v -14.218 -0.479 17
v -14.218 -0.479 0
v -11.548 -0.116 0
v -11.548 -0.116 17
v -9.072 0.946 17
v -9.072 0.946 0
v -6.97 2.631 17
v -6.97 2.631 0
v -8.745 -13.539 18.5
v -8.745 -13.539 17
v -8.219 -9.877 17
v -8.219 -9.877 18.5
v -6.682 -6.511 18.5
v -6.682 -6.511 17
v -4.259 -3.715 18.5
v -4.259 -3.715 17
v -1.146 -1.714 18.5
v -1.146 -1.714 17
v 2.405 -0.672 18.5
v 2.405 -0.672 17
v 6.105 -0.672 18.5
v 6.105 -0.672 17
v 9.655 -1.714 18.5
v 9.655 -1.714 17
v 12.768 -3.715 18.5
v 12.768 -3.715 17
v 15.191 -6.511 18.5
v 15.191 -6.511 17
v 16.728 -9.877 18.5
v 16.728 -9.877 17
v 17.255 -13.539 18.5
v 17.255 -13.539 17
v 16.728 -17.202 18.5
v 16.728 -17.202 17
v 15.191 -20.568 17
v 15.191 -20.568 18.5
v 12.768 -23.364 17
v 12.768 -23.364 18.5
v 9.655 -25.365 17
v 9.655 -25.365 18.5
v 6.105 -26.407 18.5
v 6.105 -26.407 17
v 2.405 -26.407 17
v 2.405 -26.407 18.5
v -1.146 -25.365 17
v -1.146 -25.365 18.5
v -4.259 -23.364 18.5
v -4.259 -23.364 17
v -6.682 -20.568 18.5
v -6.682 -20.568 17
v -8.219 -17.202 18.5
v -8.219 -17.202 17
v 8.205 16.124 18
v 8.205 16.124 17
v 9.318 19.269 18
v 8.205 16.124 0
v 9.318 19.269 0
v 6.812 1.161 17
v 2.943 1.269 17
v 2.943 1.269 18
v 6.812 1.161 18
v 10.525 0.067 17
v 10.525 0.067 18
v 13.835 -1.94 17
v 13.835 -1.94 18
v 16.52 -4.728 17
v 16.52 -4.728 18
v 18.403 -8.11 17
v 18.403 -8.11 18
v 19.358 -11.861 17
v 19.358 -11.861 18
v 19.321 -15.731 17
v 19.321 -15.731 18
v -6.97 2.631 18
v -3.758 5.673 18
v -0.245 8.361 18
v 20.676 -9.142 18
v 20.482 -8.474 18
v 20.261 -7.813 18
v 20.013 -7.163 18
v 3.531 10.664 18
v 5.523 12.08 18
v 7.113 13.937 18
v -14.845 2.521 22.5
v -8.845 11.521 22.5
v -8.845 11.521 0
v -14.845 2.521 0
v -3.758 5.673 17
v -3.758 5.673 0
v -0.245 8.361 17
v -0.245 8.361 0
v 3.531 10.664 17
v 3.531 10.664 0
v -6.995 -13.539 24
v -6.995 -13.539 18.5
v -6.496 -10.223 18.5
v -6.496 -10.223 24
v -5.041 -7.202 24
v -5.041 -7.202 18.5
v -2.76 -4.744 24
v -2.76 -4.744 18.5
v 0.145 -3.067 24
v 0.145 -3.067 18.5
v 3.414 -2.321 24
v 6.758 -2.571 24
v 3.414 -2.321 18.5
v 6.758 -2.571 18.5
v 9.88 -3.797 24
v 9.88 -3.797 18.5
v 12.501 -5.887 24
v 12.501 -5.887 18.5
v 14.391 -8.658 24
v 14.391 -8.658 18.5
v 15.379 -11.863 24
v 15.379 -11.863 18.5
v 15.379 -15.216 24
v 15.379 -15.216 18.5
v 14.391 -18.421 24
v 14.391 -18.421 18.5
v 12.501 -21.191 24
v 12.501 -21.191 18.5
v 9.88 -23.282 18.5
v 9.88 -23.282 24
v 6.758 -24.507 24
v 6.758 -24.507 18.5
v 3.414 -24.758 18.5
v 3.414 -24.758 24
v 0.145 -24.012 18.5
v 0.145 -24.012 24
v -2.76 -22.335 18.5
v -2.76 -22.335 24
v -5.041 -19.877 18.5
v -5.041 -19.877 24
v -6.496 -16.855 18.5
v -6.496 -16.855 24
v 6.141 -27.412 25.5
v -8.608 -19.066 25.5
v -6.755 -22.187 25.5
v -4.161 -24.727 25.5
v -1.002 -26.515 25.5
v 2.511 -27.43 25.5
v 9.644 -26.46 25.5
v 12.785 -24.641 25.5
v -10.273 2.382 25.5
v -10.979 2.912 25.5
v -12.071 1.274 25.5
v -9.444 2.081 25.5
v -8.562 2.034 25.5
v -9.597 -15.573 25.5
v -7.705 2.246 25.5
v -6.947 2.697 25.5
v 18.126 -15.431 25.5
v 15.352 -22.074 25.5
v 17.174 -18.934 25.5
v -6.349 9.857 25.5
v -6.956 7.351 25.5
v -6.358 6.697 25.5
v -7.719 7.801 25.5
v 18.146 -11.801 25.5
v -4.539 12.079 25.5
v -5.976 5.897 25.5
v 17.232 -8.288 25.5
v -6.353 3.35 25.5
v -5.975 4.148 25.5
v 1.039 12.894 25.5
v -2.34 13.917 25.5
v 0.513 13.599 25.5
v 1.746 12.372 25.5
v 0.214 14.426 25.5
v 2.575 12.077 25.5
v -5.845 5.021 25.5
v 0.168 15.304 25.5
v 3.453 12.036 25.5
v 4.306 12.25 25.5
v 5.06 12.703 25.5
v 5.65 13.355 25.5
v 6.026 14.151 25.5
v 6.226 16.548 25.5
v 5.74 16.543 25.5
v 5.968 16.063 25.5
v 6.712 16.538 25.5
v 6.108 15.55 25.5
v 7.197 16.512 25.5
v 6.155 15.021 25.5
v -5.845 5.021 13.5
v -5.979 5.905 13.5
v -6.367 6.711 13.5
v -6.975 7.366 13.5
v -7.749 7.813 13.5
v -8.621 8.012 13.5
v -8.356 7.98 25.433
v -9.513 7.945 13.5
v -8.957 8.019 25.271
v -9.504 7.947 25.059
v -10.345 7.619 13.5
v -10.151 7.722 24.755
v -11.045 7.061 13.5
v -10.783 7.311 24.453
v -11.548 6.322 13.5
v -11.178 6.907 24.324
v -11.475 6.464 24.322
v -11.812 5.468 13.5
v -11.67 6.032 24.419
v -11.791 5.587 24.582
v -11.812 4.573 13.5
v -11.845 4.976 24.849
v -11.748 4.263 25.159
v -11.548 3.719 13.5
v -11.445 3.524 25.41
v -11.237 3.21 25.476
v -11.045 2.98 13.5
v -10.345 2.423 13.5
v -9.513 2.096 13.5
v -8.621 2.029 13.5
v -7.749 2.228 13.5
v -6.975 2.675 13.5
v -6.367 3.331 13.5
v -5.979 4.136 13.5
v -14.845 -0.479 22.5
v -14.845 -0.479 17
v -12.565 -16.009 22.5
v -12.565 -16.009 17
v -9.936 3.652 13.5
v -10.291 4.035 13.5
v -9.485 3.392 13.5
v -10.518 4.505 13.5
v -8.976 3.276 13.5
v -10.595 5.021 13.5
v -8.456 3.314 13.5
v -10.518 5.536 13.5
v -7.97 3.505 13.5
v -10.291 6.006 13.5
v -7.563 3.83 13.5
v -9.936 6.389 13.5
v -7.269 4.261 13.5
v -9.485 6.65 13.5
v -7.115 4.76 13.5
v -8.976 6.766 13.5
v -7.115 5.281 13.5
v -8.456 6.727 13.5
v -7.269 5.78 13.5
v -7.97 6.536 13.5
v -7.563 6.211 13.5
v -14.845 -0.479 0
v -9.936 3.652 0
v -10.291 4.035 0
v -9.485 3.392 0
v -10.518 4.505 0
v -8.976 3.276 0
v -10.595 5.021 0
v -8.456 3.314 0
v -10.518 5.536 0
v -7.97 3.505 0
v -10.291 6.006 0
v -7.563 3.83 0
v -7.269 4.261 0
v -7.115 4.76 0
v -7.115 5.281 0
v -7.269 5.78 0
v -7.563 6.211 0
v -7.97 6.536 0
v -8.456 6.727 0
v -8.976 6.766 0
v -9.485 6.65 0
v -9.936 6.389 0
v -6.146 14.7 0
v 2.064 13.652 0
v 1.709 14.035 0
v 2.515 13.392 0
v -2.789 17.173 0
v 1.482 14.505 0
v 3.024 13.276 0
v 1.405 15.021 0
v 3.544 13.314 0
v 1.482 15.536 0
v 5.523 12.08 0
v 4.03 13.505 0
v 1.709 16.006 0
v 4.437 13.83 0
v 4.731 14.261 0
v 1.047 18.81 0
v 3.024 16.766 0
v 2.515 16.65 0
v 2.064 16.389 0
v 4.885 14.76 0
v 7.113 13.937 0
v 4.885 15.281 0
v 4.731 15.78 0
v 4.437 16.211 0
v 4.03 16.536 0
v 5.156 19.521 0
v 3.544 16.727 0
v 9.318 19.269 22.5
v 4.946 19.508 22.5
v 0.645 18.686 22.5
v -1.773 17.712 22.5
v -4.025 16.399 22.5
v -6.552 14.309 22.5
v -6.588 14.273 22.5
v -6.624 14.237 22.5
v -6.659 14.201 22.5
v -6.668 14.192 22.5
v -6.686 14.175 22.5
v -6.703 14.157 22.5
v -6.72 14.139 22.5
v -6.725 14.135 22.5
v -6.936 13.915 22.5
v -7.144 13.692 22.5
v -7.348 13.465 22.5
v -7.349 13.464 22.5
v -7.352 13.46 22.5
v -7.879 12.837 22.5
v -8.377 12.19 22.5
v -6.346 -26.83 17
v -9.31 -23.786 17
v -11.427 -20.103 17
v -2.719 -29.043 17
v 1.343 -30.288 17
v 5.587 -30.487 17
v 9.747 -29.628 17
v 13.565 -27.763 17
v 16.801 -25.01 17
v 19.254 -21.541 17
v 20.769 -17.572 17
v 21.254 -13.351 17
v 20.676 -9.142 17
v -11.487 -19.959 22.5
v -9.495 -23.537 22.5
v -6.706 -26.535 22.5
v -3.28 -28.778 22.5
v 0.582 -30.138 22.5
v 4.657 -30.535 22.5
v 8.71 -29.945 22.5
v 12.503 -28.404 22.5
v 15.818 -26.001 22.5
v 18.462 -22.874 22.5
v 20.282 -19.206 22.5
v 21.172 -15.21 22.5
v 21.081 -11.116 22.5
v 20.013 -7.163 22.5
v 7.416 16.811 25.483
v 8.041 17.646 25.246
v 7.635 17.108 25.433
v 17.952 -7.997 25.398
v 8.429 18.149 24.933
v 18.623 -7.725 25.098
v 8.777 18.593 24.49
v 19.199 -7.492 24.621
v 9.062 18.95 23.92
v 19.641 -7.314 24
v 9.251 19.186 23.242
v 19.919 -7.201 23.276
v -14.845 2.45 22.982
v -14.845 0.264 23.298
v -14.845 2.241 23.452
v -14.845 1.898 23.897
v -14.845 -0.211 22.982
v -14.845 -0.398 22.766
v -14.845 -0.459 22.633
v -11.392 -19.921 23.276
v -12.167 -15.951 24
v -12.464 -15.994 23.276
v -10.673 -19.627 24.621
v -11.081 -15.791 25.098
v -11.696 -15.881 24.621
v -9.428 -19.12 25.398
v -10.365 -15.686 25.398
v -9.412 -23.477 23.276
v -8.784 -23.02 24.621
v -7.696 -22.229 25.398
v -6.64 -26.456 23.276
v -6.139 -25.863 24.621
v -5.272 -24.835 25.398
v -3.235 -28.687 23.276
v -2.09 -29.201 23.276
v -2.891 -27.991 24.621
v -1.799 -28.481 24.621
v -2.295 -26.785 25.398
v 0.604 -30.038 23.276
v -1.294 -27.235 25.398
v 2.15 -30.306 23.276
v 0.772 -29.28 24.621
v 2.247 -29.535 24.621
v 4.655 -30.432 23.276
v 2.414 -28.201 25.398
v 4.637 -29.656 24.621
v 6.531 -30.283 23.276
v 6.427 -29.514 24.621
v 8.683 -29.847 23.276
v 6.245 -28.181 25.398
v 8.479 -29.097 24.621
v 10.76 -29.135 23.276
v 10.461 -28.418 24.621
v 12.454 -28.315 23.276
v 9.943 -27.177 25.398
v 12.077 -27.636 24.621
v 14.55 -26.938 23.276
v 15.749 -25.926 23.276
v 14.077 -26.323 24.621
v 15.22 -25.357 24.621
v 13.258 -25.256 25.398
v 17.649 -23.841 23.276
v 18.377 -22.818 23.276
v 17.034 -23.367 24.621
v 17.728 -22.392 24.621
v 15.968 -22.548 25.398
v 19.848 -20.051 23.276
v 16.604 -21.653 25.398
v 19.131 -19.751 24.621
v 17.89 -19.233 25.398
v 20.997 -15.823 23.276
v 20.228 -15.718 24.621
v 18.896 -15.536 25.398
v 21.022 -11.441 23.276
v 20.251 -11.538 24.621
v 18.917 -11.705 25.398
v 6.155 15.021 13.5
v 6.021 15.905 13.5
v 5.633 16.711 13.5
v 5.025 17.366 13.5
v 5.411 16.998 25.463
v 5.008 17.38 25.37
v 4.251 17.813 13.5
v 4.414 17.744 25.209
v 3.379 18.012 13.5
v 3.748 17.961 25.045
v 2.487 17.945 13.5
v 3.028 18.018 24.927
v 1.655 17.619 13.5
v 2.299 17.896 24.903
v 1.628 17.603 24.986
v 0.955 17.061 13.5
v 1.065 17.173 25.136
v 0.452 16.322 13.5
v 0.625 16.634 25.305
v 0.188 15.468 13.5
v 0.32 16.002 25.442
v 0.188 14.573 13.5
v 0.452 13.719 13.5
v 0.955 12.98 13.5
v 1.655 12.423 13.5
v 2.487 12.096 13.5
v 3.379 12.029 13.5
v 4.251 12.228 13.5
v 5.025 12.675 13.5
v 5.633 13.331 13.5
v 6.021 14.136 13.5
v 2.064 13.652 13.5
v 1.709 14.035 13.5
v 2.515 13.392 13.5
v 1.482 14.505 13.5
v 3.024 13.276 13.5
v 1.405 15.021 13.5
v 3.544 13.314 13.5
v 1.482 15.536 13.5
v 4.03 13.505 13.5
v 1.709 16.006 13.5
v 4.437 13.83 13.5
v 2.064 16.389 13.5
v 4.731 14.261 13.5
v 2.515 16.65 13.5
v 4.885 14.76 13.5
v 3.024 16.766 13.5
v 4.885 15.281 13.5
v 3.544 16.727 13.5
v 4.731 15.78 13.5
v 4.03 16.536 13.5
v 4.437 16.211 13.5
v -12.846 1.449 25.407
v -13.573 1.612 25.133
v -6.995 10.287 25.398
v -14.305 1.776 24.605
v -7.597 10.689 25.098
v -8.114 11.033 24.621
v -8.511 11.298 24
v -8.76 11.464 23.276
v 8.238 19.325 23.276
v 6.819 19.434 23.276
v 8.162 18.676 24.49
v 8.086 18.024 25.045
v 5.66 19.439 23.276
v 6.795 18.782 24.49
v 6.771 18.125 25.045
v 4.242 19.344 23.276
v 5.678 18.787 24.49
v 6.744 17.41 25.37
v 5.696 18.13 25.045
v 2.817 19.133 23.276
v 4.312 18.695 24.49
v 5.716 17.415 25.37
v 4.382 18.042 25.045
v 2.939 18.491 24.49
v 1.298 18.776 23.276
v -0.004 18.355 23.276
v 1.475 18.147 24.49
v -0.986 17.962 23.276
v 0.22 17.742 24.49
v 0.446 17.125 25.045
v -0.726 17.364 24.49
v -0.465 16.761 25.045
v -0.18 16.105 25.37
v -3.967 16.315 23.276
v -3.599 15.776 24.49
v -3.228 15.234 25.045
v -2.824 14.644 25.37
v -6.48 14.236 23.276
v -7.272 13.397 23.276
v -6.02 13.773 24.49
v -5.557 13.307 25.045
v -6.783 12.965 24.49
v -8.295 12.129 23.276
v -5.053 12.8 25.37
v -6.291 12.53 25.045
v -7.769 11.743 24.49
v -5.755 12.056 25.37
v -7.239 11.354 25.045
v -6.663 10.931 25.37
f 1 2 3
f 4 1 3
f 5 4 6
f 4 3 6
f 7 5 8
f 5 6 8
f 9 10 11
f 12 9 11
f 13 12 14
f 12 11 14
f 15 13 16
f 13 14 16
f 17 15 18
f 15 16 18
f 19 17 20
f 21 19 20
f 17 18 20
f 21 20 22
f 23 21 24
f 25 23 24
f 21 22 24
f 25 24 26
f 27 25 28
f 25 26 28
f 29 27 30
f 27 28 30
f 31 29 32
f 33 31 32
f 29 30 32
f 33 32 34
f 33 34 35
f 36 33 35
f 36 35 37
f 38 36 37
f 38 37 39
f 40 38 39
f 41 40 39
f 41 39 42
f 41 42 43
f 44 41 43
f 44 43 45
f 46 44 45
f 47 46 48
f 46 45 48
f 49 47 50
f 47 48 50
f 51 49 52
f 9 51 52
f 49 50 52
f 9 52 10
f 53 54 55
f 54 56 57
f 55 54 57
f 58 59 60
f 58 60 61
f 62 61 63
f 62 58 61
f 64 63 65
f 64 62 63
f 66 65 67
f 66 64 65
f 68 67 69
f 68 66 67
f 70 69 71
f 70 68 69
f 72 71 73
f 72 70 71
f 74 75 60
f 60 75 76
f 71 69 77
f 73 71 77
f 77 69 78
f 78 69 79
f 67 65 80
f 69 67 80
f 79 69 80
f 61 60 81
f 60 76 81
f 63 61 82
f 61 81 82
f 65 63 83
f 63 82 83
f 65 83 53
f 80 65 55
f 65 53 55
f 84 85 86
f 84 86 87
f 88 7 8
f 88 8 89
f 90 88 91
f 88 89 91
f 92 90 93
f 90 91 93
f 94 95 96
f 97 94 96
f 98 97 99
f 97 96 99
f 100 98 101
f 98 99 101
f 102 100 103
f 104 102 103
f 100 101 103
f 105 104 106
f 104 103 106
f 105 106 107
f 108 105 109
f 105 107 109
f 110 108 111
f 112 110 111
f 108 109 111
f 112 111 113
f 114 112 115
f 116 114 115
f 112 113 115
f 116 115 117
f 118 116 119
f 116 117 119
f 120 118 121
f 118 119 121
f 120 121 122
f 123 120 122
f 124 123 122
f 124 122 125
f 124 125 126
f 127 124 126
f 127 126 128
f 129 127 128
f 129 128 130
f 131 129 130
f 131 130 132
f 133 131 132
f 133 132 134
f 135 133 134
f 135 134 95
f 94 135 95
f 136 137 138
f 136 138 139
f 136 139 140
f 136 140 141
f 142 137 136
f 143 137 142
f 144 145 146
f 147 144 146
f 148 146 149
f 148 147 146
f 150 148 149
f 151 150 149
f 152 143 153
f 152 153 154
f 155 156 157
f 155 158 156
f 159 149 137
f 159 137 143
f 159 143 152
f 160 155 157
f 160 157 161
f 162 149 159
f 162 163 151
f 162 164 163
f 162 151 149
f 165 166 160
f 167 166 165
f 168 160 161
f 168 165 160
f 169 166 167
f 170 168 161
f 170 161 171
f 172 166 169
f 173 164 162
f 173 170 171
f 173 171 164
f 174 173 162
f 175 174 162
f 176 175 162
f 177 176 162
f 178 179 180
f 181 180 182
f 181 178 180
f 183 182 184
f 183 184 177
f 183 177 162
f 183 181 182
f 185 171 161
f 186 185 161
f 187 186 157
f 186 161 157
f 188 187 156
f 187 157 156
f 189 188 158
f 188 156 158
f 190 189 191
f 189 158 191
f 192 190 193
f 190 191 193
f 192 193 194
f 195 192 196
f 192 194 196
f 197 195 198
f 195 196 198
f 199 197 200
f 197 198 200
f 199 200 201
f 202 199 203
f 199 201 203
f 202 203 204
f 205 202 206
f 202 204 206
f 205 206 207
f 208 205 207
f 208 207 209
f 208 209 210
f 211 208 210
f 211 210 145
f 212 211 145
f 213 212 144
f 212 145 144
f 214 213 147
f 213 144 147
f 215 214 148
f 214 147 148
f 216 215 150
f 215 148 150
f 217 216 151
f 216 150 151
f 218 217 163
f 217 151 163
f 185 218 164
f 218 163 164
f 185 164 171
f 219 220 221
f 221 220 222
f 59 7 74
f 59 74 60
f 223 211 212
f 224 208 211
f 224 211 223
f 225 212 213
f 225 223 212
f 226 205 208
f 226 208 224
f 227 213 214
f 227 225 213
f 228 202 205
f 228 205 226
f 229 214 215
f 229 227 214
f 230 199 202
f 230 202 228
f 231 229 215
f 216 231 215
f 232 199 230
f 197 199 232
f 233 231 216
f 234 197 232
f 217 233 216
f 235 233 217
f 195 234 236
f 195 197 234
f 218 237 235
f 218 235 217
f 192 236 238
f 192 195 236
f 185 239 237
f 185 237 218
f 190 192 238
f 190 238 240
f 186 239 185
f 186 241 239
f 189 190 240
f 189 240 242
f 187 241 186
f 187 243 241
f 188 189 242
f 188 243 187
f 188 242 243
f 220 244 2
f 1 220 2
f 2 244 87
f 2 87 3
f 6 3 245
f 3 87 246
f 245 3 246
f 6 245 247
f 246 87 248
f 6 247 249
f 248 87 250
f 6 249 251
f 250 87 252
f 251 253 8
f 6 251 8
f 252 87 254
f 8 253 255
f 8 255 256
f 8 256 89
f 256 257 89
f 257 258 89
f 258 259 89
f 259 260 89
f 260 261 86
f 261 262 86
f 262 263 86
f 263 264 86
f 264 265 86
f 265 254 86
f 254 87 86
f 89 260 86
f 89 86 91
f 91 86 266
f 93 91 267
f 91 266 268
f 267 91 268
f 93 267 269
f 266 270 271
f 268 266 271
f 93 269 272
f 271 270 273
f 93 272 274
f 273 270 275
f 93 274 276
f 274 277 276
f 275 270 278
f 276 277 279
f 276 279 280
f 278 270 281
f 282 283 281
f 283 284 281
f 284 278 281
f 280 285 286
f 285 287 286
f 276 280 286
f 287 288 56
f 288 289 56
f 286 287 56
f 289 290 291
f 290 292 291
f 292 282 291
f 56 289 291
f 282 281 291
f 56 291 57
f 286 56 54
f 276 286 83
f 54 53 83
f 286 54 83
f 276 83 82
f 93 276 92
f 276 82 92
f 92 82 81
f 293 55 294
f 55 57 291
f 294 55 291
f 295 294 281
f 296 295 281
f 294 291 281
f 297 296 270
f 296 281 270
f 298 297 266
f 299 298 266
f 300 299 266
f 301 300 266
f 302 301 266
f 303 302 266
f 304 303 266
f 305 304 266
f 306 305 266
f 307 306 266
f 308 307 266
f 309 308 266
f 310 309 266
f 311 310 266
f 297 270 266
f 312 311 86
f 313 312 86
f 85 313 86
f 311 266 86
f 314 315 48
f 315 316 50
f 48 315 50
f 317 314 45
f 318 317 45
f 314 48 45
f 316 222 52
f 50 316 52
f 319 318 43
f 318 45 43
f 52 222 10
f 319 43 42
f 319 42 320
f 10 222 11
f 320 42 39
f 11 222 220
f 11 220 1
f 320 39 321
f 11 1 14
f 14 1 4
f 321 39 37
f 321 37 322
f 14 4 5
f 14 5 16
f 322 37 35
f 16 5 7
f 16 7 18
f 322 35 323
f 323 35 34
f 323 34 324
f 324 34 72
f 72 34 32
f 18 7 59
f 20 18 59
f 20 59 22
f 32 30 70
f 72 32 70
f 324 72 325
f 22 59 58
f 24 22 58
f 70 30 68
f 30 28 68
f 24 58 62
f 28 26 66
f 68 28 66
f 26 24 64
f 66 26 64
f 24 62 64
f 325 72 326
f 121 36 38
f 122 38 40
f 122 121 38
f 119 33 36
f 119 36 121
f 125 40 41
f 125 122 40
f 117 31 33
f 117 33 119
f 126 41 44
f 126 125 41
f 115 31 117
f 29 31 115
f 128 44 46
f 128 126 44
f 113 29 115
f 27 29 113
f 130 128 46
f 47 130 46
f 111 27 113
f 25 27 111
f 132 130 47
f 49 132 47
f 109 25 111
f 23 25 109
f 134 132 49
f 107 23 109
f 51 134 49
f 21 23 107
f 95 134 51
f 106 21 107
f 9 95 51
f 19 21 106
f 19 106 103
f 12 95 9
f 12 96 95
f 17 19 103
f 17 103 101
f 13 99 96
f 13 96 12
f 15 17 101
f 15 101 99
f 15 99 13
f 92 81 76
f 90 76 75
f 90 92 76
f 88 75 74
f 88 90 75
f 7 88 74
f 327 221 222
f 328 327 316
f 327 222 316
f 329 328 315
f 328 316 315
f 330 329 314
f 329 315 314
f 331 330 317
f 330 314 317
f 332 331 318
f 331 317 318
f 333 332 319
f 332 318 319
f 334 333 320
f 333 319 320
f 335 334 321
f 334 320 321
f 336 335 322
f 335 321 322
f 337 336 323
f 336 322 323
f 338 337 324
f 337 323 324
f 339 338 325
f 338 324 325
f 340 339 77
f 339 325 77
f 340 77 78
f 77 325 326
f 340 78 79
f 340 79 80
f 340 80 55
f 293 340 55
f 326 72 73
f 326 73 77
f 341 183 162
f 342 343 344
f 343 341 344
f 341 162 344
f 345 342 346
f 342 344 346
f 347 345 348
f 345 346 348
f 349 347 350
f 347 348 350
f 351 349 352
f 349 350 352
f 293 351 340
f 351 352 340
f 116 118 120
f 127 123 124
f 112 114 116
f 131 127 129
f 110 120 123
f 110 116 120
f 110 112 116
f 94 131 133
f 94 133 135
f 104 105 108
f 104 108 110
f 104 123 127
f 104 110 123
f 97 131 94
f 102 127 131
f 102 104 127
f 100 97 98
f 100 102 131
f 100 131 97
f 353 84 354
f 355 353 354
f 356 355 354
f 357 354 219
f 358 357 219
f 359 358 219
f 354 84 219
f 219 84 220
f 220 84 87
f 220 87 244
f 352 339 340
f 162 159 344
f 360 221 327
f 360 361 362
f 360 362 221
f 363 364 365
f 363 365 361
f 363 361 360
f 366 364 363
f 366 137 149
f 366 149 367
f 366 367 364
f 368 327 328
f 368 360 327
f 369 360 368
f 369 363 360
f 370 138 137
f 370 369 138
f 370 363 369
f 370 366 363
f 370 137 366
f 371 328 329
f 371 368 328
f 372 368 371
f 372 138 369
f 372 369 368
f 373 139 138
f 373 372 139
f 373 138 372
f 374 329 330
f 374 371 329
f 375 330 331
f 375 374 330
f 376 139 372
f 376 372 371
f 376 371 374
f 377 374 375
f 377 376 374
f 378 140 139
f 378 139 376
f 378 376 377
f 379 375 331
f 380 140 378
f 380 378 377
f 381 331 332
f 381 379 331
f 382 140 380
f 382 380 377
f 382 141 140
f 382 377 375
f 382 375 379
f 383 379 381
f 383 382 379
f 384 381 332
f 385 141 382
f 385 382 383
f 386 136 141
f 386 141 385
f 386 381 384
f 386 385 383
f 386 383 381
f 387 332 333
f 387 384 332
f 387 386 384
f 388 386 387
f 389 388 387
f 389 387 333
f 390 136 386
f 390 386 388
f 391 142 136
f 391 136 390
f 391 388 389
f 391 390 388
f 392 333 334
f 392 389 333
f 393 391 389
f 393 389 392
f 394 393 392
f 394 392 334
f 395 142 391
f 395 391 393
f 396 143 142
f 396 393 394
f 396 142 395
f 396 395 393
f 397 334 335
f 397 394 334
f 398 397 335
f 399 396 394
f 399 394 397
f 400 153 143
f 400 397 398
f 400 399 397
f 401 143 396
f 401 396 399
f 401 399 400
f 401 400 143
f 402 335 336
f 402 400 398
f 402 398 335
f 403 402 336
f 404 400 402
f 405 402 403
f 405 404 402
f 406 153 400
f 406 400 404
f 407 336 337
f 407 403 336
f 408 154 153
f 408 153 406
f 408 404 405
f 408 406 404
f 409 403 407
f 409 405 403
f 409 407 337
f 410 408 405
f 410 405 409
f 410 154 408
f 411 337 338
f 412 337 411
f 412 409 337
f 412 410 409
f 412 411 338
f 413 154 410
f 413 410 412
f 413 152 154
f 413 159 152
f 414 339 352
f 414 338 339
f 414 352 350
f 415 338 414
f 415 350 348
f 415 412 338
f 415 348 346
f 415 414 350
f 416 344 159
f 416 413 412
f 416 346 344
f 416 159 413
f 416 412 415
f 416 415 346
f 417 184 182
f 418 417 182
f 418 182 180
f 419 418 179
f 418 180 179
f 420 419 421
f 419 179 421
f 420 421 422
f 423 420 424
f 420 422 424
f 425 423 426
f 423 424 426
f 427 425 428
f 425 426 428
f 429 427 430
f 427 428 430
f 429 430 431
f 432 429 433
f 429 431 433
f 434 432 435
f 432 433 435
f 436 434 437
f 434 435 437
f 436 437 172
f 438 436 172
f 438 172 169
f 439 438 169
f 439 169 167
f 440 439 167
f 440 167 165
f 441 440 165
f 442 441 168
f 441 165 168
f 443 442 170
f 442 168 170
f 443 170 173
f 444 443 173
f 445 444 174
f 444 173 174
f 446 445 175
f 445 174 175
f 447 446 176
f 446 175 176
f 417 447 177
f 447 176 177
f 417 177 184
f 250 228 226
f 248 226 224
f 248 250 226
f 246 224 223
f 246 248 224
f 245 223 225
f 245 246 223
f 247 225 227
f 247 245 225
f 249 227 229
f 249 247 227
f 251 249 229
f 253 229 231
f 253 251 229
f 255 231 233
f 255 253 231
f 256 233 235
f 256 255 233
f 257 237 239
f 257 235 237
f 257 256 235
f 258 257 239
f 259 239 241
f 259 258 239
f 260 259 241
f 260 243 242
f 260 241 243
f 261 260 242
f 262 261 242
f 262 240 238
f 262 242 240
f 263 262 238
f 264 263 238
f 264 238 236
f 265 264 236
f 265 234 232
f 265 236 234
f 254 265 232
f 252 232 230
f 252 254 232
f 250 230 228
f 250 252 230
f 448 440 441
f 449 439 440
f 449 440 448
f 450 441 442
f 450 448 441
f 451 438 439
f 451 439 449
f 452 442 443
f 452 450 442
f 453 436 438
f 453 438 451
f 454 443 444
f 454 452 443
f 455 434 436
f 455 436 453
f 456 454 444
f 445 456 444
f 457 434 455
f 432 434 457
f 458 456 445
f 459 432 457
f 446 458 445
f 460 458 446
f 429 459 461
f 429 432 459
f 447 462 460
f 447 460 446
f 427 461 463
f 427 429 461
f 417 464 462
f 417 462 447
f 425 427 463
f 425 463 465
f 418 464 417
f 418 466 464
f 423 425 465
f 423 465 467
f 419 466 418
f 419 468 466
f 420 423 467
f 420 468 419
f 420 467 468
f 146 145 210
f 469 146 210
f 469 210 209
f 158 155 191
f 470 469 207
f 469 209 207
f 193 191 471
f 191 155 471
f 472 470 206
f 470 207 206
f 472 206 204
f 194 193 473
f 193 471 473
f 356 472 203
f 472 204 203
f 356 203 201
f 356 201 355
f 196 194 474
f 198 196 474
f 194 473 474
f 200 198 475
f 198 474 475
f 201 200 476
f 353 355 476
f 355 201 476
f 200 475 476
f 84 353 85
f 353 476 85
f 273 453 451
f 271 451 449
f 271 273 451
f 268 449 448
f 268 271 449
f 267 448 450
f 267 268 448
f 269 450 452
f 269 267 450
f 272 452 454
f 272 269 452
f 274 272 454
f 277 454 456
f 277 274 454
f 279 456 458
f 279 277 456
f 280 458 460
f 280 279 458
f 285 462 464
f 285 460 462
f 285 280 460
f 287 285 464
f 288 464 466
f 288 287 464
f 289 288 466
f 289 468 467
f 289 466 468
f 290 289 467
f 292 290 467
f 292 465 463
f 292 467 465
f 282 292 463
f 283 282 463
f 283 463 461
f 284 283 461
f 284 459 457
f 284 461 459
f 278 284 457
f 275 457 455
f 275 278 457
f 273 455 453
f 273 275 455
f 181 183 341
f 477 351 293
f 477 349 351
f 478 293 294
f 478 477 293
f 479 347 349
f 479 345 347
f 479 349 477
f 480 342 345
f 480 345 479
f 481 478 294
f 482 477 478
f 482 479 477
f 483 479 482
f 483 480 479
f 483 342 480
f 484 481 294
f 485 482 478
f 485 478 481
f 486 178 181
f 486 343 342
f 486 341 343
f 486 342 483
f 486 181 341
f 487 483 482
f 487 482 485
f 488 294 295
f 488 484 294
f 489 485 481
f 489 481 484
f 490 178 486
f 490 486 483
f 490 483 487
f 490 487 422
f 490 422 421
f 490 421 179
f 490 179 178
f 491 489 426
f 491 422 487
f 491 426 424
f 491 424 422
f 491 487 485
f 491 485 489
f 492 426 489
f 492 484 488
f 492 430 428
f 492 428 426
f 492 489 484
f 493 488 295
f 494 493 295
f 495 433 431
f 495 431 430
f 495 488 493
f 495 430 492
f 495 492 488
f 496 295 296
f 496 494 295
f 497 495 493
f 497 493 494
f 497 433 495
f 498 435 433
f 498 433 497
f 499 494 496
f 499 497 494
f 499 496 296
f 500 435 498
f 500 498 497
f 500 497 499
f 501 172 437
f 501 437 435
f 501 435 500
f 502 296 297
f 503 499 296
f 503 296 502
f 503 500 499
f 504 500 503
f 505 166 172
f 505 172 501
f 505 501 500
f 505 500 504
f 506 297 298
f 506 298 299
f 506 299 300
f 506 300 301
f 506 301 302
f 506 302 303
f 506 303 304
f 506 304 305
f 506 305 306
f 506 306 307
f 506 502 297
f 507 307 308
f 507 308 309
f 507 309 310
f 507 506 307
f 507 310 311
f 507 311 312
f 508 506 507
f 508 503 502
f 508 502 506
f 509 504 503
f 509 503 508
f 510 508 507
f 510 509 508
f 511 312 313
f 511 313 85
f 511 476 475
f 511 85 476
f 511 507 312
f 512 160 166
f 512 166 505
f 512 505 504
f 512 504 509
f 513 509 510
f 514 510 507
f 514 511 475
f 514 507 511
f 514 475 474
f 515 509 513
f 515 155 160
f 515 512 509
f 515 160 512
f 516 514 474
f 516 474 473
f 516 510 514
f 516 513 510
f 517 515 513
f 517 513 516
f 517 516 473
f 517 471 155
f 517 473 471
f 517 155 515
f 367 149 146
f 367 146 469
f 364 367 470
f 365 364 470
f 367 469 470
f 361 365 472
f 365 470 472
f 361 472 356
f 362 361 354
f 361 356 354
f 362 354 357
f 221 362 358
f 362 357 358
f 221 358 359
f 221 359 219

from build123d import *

# Parameters (mm, degrees)
SKETCH1_R                = 1.75
BOSS_EXTRUDE1_DEPTH      = 21
FILLET3_R                = 10
BOSS_EXTRUDE2_DEPTH      = 4.5
BOSS_EXTRUDE2_DEPTH_BACK = 4
SKETCH3_R                = 1.75
SKETCH4_R                = 11.25
CUT_EXTRUDE1_DEPTH       = 7
SKETCH5_R                = 13
CUT_EXTRUDE2_DEPTH       = 1.5
SKETCH6_R                = 3
CUT_EXTRUDE3_DEPTH       = 12
CUT_EXTRUDE4_DEPTH       = 1
FILLET7_R                = 3
FILLET8_R                = 10


with BuildPart() as part:
    # Sketch1 → Boss-Extrude1 (new body)
    with BuildSketch(Plane.XY):
        with BuildLine():
            Line((-8.845360825, 11.520618557), (-14.845360825, 2.520618557))
            Line((-14.845360825, 2.520618557), (-14.845360825, -0.479381443))
            Line((-14.845360825, -0.479381443), (-9.845360825, -0.479381443))
            Line((-9.845360825, -0.479381443), (-8.845360825, 0.520618557))
            ThreePointArc((-8.845360825, 0.520618557), (-1.696742799, 7.320595709), (6.83903909, 12.26861112))
            Line((6.83903909, 12.26861112), (9.318301605, 19.26861112))
            ThreePointArc((9.318301605, 19.26861112), (-0.918731235, 18.102760488), (-8.845360825, 11.520618557))
        make_face()
        with Locations(Location((-8.845360825, 5.020618557, 0), (0, 0, 180))):
            Circle(SKETCH1_R, mode=Mode.SUBTRACT)
        with Locations(Location((3.154639175, 15.020618557, 0), (0, 0, 180))):
            Circle(SKETCH1_R, mode=Mode.SUBTRACT)
    extrude(amount=BOSS_EXTRUDE1_DEPTH)

    # Fillet3
    # the kernel refuses this fillet: 10 mm, written as the material it takes off along each edge
    with BuildSketch(Plane(origin=(-9.845360825, -0.479381443, -10.932362995), x_dir=(-1, 0, 0), z_dir=(0, 0, 1))) as fillet3_piece_1:
        with BuildLine():
            CenterArc((4.372945198, -10), FILLET3_R, 90, 46.455884642)
            Line((-2.87549632, -3.110871204), (-3.600340471, -2.421958325))
            ThreePointArc((-3.600340471, -2.421958325), (-1.769425443, -0.361263367), (-0.707106781, 0.707106781))
            Line((-0.707106781, 0.707106781), (0, 1))
            Line((0, 1), (4.372945198, 1))
            Line((4.372945198, 1), (4.372945198, 0))
        make_face()
    extrude(amount=42.86472599, mode=Mode.SUBTRACT)

    # Sketch3 → Boss-Extrude2 (add, two sides: drawn at the far end of the back side and taken through both)
    with BuildSketch(Plane.XY.offset(21).offset(-BOSS_EXTRUDE2_DEPTH_BACK)):
        with BuildLine():
            Line((-14.845360825, 2.520618557), (-14.845360825, -0.479381443))
            Line((-14.845360825, -0.479381443), (-12.565000182, -16.009144975))
            ThreePointArc((-12.565000182, -16.009144975), (8.709502938, -29.945300767), (20.013420995, -7.162799635))
            Line((20.013420995, -7.162799635), (9.318301605, 19.26861112))
            ThreePointArc((9.318301605, 19.26861112), (-0.918731235, 18.102760488), (-8.845360825, 11.520618557))
            Line((-8.845360825, 11.520618557), (-14.845360825, 2.520618557))
        make_face()
        with Locations(Location((3.154639175, 15.020618557, 0), (0, 0, 180))):
            Circle(SKETCH3_R, mode=Mode.SUBTRACT)
        with Locations(Location((-8.845360825, 5.020618557, 0), (0, 0, 180))):
            Circle(SKETCH3_R, mode=Mode.SUBTRACT)
    extrude(amount=BOSS_EXTRUDE2_DEPTH + BOSS_EXTRUDE2_DEPTH_BACK)

    # Sketch4 → Cut-Extrude1 (cut)
    with BuildSketch(Plane(origin=(0, 0, 17), x_dir=(-1, 0, 0), z_dir=(0, 0, -1))):
        with Locations((-4.254639175, -13.539381443)):
            Circle(SKETCH4_R)
    extrude(amount=-CUT_EXTRUDE1_DEPTH, mode=Mode.SUBTRACT)

    # Sketch5 → Cut-Extrude2 (cut)
    with BuildSketch(Plane(origin=(0, 0, 17), x_dir=(-1, 0, 0), z_dir=(0, 0, -1))):
        with Locations((-4.254639175, -13.539381443)):
            Circle(SKETCH5_R)
    extrude(amount=-CUT_EXTRUDE2_DEPTH, mode=Mode.SUBTRACT)

    # Sketch6 → Cut-Extrude3 (cut)
    with BuildSketch(Plane.XY.offset(25.5)):
        with Locations((-8.845360825, 5.020618557)):
            Circle(SKETCH6_R)
        with Locations((3.154639175, 15.020618557)):
            Circle(SKETCH6_R)
    extrude(amount=-CUT_EXTRUDE3_DEPTH, mode=Mode.SUBTRACT)

    # Sketch7 → Cut-Extrude4 (cut)
    with BuildSketch(Plane(origin=(0, 0, 17), x_dir=(-1, 0, 0), z_dir=(0, 0, -1))):
        with BuildLine():
            Line((-19.320512006, -15.73138888), (-26.521187379, 19.26861112))
            Line((-26.521187379, 19.26861112), (-9.318301605, 19.26861112))
            Line((-9.318301605, 19.26861112), (-6.83903909, 12.26861112))
            ThreePointArc((-6.83903909, 12.26861112), (0.552528201, 8.148031782), (6.969864505, 2.631489761))
            Line((6.969864505, 2.631489761), (-2.943055137, 1.26861112))
            ThreePointArc((-2.943055137, 1.26861112), (-15.267616881, -3.247010549), (-19.320512006, -15.73138888))
        make_face()
    extrude(amount=-CUT_EXTRUDE4_DEPTH, mode=Mode.SUBTRACT)

    # Fillet7
    # the kernel refuses this fillet: 3 mm, written as the material it takes off along each edge
    with BuildSketch(Plane(origin=(-8.845360825, 11.520618557, 25.5), x_dir=(0, 0, -1), z_dir=(-0.554700196225229, -0.8320502943378438, 0))) as fillet7_piece_1:
        with BuildLine():
            CenterArc((FILLET7_R, FILLET7_R), FILLET7_R, 180, 90)
            Line((0, FILLET7_R), (0, 0))
            Line((0, 0), (FILLET7_R, 0))
        make_face()
    extrude(amount=18.316653826, mode=Mode.SUBTRACT)
    with BuildSketch(Plane(origin=(-18.114165499, 21.781905941, 25.5), x_dir=(0, 0, -1), z_dir=(0.14528020772302286, -0.9893905504116943, 0))) as fillet7_piece_2:
        with BuildLine():
            CenterArc((FILLET7_R, FILLET7_R), FILLET7_R, 180, 90)
            Line((0, FILLET7_R), (0, 0))
            Line((0, 0), (FILLET7_R, 0))
        make_face()
    extrude(amount=38.196292556, mode=Mode.SUBTRACT)
    with BuildSketch(Plane(origin=(4.254639175, -13.539381443, 25.5), x_dir=(-0.9893905504116943, -0.14528020772302197, 0), z_dir=(-0.14528020772302197, 0.9893905504116943, 0))) as fillet7_piece_3:
        with BuildLine():
            CenterArc((17 - FILLET7_R, -FILLET7_R), FILLET7_R, 0, 90)
            Line((17 - FILLET7_R, 0), (17, 0))
            Line((17, 0), (17, -FILLET7_R))
        make_face()
    revolve(axis=Axis((4.254639175, -13.539381443, 25.5), (0, 0, 1)), revolution_arc=193.67655813, mode=Mode.SUBTRACT)
    with BuildSketch(Plane(origin=(6.154639175, 1.520618557, 25.5), x_dir=(0.5584515746383966, 0.8295371232102247, 0), z_dir=(0.8295371232102247, -0.5584515746383966, 0))) as fillet7_piece_4:
        with BuildLine():
            CenterArc((18.027756377 - FILLET7_R, -FILLET7_R), FILLET7_R, 0, 90)
            Line((18.027756377 - FILLET7_R, 0), (18.027756377, 0))
            Line((18.027756377, 0), (18.027756377, -FILLET7_R))
        make_face()
    revolve(axis=Axis((6.154639175, 1.520618557, 25.5), (0, 0, 1)), revolution_arc=90.258713785, mode=Mode.SUBTRACT)
    with BuildSketch(Plane(origin=(20.013420995, -7.162799635, 25.5), x_dir=(-0.9269871658598542, -0.3750930475643543, 0), z_dir=(-0.37509304756435435, 0.9269871658598543, 0))) as fillet7_piece_5:
        with BuildLine():
            CenterArc((FILLET7_R, -FILLET7_R), FILLET7_R, 90, 90)
            Line((0, -FILLET7_R), (0, 0))
            Line((0, 0), (FILLET7_R, 0))
        make_face()
    extrude(amount=36.013243471, mode=Mode.SUBTRACT)

    # Fillet8
    fillet8_edges = [part.edges().sort_by_distance(p)[0] for p in [
        (6.83903909, 12.26861112, 9),
    ]]
    fillet(fillet8_edges, radius=FILLET8_R)


solid = part.part
